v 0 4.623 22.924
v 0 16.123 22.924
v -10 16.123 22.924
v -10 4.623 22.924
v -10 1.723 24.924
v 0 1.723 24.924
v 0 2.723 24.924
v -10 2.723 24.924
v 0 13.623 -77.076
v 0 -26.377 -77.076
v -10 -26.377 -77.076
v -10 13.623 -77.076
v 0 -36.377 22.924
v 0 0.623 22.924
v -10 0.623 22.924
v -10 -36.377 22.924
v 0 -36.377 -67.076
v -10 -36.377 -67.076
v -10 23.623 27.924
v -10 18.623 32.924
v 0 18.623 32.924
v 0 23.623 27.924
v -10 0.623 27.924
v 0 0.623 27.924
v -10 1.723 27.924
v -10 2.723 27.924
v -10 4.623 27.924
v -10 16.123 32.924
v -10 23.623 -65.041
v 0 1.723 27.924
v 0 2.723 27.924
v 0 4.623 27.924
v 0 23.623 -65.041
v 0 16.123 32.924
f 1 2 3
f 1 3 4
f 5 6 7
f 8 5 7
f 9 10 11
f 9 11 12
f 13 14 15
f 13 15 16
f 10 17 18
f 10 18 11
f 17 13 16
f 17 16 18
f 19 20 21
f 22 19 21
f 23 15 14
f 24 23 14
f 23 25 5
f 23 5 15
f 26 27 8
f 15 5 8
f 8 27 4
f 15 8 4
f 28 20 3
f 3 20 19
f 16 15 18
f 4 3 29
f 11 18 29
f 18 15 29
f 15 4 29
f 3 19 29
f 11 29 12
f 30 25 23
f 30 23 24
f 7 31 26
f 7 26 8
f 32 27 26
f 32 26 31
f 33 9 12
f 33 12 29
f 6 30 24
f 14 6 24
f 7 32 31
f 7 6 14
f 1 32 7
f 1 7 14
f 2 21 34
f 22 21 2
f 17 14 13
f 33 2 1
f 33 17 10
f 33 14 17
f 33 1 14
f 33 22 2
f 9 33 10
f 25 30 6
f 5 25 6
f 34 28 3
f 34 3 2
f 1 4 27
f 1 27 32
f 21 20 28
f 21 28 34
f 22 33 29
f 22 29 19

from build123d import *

# Parameters (mm, degrees)
BOSS_EXTRUDE1_DEPTH = 10
SKETCH2_W           = 10
SKETCH2_H           = 4
BOSS_EXTRUDE2_DEPTH = 5
SKETCH3_W           = 10
SKETCH3_H           = 7.5
BOSS_EXTRUDE3_DEPTH = 10
CHAMFER1_SIZE       = 5
SKETCH4_W           = 3
SKETCH4_H           = 1
CUT_EXTRUDE1_DEPTH  = 10


with BuildPart() as part:
    # Sketch1 → Boss-Extrude1 (new body)
    with BuildSketch(Plane(origin=(0, 0, 0), x_dir=(0, 0, -1), z_dir=(1, 0, 0))):
        Polygon((-22.923508233, 18.622830226), (-22.923508233, -36.377169774), (67.076491767, -36.377169774), (77.076491767, -26.377169774), (77.076491767, 13.622830226), (65.041232226, 23.622830226), (-14.958767774, 23.622830226), align=None)
    extrude(amount=-BOSS_EXTRUDE1_DEPTH)

    # Sketch2 → Boss-Extrude2 (add)
    with BuildSketch(Plane.XY.offset(22.923508233)):
        with Locations((-5, 2.622830226)):
            Rectangle(SKETCH2_W, SKETCH2_H)
    extrude(amount=BOSS_EXTRUDE2_DEPTH)

    # Sketch3 → Boss-Extrude3 (add, symmetric)
    with BuildSketch(Plane.XY.offset(22.923508233)):
        with Locations((-5, 19.872830226)):
            Rectangle(SKETCH3_W, SKETCH3_H)
    extrude(amount=BOSS_EXTRUDE3_DEPTH, both=True)

    # Chamfer1
    chamfer1_edges = [part.edges().sort_by_distance(p)[0] for p in [
        (-5, 23.622830226, 32.923508233),
    ]]
    chamfer(chamfer1_edges, length=CHAMFER1_SIZE)

    # Sketch4 → Cut-Extrude1 (cut)
    with BuildSketch(Plane(origin=(0, 0, 0), x_dir=(0, 0, -1), z_dir=(1, 0, 0))):
        with Locations((-26.423508233, 2.222830226)):
            Rectangle(SKETCH4_W, SKETCH4_H)
    extrude(amount=-CUT_EXTRUDE1_DEPTH, mode=Mode.SUBTRACT)


solid = part.part
